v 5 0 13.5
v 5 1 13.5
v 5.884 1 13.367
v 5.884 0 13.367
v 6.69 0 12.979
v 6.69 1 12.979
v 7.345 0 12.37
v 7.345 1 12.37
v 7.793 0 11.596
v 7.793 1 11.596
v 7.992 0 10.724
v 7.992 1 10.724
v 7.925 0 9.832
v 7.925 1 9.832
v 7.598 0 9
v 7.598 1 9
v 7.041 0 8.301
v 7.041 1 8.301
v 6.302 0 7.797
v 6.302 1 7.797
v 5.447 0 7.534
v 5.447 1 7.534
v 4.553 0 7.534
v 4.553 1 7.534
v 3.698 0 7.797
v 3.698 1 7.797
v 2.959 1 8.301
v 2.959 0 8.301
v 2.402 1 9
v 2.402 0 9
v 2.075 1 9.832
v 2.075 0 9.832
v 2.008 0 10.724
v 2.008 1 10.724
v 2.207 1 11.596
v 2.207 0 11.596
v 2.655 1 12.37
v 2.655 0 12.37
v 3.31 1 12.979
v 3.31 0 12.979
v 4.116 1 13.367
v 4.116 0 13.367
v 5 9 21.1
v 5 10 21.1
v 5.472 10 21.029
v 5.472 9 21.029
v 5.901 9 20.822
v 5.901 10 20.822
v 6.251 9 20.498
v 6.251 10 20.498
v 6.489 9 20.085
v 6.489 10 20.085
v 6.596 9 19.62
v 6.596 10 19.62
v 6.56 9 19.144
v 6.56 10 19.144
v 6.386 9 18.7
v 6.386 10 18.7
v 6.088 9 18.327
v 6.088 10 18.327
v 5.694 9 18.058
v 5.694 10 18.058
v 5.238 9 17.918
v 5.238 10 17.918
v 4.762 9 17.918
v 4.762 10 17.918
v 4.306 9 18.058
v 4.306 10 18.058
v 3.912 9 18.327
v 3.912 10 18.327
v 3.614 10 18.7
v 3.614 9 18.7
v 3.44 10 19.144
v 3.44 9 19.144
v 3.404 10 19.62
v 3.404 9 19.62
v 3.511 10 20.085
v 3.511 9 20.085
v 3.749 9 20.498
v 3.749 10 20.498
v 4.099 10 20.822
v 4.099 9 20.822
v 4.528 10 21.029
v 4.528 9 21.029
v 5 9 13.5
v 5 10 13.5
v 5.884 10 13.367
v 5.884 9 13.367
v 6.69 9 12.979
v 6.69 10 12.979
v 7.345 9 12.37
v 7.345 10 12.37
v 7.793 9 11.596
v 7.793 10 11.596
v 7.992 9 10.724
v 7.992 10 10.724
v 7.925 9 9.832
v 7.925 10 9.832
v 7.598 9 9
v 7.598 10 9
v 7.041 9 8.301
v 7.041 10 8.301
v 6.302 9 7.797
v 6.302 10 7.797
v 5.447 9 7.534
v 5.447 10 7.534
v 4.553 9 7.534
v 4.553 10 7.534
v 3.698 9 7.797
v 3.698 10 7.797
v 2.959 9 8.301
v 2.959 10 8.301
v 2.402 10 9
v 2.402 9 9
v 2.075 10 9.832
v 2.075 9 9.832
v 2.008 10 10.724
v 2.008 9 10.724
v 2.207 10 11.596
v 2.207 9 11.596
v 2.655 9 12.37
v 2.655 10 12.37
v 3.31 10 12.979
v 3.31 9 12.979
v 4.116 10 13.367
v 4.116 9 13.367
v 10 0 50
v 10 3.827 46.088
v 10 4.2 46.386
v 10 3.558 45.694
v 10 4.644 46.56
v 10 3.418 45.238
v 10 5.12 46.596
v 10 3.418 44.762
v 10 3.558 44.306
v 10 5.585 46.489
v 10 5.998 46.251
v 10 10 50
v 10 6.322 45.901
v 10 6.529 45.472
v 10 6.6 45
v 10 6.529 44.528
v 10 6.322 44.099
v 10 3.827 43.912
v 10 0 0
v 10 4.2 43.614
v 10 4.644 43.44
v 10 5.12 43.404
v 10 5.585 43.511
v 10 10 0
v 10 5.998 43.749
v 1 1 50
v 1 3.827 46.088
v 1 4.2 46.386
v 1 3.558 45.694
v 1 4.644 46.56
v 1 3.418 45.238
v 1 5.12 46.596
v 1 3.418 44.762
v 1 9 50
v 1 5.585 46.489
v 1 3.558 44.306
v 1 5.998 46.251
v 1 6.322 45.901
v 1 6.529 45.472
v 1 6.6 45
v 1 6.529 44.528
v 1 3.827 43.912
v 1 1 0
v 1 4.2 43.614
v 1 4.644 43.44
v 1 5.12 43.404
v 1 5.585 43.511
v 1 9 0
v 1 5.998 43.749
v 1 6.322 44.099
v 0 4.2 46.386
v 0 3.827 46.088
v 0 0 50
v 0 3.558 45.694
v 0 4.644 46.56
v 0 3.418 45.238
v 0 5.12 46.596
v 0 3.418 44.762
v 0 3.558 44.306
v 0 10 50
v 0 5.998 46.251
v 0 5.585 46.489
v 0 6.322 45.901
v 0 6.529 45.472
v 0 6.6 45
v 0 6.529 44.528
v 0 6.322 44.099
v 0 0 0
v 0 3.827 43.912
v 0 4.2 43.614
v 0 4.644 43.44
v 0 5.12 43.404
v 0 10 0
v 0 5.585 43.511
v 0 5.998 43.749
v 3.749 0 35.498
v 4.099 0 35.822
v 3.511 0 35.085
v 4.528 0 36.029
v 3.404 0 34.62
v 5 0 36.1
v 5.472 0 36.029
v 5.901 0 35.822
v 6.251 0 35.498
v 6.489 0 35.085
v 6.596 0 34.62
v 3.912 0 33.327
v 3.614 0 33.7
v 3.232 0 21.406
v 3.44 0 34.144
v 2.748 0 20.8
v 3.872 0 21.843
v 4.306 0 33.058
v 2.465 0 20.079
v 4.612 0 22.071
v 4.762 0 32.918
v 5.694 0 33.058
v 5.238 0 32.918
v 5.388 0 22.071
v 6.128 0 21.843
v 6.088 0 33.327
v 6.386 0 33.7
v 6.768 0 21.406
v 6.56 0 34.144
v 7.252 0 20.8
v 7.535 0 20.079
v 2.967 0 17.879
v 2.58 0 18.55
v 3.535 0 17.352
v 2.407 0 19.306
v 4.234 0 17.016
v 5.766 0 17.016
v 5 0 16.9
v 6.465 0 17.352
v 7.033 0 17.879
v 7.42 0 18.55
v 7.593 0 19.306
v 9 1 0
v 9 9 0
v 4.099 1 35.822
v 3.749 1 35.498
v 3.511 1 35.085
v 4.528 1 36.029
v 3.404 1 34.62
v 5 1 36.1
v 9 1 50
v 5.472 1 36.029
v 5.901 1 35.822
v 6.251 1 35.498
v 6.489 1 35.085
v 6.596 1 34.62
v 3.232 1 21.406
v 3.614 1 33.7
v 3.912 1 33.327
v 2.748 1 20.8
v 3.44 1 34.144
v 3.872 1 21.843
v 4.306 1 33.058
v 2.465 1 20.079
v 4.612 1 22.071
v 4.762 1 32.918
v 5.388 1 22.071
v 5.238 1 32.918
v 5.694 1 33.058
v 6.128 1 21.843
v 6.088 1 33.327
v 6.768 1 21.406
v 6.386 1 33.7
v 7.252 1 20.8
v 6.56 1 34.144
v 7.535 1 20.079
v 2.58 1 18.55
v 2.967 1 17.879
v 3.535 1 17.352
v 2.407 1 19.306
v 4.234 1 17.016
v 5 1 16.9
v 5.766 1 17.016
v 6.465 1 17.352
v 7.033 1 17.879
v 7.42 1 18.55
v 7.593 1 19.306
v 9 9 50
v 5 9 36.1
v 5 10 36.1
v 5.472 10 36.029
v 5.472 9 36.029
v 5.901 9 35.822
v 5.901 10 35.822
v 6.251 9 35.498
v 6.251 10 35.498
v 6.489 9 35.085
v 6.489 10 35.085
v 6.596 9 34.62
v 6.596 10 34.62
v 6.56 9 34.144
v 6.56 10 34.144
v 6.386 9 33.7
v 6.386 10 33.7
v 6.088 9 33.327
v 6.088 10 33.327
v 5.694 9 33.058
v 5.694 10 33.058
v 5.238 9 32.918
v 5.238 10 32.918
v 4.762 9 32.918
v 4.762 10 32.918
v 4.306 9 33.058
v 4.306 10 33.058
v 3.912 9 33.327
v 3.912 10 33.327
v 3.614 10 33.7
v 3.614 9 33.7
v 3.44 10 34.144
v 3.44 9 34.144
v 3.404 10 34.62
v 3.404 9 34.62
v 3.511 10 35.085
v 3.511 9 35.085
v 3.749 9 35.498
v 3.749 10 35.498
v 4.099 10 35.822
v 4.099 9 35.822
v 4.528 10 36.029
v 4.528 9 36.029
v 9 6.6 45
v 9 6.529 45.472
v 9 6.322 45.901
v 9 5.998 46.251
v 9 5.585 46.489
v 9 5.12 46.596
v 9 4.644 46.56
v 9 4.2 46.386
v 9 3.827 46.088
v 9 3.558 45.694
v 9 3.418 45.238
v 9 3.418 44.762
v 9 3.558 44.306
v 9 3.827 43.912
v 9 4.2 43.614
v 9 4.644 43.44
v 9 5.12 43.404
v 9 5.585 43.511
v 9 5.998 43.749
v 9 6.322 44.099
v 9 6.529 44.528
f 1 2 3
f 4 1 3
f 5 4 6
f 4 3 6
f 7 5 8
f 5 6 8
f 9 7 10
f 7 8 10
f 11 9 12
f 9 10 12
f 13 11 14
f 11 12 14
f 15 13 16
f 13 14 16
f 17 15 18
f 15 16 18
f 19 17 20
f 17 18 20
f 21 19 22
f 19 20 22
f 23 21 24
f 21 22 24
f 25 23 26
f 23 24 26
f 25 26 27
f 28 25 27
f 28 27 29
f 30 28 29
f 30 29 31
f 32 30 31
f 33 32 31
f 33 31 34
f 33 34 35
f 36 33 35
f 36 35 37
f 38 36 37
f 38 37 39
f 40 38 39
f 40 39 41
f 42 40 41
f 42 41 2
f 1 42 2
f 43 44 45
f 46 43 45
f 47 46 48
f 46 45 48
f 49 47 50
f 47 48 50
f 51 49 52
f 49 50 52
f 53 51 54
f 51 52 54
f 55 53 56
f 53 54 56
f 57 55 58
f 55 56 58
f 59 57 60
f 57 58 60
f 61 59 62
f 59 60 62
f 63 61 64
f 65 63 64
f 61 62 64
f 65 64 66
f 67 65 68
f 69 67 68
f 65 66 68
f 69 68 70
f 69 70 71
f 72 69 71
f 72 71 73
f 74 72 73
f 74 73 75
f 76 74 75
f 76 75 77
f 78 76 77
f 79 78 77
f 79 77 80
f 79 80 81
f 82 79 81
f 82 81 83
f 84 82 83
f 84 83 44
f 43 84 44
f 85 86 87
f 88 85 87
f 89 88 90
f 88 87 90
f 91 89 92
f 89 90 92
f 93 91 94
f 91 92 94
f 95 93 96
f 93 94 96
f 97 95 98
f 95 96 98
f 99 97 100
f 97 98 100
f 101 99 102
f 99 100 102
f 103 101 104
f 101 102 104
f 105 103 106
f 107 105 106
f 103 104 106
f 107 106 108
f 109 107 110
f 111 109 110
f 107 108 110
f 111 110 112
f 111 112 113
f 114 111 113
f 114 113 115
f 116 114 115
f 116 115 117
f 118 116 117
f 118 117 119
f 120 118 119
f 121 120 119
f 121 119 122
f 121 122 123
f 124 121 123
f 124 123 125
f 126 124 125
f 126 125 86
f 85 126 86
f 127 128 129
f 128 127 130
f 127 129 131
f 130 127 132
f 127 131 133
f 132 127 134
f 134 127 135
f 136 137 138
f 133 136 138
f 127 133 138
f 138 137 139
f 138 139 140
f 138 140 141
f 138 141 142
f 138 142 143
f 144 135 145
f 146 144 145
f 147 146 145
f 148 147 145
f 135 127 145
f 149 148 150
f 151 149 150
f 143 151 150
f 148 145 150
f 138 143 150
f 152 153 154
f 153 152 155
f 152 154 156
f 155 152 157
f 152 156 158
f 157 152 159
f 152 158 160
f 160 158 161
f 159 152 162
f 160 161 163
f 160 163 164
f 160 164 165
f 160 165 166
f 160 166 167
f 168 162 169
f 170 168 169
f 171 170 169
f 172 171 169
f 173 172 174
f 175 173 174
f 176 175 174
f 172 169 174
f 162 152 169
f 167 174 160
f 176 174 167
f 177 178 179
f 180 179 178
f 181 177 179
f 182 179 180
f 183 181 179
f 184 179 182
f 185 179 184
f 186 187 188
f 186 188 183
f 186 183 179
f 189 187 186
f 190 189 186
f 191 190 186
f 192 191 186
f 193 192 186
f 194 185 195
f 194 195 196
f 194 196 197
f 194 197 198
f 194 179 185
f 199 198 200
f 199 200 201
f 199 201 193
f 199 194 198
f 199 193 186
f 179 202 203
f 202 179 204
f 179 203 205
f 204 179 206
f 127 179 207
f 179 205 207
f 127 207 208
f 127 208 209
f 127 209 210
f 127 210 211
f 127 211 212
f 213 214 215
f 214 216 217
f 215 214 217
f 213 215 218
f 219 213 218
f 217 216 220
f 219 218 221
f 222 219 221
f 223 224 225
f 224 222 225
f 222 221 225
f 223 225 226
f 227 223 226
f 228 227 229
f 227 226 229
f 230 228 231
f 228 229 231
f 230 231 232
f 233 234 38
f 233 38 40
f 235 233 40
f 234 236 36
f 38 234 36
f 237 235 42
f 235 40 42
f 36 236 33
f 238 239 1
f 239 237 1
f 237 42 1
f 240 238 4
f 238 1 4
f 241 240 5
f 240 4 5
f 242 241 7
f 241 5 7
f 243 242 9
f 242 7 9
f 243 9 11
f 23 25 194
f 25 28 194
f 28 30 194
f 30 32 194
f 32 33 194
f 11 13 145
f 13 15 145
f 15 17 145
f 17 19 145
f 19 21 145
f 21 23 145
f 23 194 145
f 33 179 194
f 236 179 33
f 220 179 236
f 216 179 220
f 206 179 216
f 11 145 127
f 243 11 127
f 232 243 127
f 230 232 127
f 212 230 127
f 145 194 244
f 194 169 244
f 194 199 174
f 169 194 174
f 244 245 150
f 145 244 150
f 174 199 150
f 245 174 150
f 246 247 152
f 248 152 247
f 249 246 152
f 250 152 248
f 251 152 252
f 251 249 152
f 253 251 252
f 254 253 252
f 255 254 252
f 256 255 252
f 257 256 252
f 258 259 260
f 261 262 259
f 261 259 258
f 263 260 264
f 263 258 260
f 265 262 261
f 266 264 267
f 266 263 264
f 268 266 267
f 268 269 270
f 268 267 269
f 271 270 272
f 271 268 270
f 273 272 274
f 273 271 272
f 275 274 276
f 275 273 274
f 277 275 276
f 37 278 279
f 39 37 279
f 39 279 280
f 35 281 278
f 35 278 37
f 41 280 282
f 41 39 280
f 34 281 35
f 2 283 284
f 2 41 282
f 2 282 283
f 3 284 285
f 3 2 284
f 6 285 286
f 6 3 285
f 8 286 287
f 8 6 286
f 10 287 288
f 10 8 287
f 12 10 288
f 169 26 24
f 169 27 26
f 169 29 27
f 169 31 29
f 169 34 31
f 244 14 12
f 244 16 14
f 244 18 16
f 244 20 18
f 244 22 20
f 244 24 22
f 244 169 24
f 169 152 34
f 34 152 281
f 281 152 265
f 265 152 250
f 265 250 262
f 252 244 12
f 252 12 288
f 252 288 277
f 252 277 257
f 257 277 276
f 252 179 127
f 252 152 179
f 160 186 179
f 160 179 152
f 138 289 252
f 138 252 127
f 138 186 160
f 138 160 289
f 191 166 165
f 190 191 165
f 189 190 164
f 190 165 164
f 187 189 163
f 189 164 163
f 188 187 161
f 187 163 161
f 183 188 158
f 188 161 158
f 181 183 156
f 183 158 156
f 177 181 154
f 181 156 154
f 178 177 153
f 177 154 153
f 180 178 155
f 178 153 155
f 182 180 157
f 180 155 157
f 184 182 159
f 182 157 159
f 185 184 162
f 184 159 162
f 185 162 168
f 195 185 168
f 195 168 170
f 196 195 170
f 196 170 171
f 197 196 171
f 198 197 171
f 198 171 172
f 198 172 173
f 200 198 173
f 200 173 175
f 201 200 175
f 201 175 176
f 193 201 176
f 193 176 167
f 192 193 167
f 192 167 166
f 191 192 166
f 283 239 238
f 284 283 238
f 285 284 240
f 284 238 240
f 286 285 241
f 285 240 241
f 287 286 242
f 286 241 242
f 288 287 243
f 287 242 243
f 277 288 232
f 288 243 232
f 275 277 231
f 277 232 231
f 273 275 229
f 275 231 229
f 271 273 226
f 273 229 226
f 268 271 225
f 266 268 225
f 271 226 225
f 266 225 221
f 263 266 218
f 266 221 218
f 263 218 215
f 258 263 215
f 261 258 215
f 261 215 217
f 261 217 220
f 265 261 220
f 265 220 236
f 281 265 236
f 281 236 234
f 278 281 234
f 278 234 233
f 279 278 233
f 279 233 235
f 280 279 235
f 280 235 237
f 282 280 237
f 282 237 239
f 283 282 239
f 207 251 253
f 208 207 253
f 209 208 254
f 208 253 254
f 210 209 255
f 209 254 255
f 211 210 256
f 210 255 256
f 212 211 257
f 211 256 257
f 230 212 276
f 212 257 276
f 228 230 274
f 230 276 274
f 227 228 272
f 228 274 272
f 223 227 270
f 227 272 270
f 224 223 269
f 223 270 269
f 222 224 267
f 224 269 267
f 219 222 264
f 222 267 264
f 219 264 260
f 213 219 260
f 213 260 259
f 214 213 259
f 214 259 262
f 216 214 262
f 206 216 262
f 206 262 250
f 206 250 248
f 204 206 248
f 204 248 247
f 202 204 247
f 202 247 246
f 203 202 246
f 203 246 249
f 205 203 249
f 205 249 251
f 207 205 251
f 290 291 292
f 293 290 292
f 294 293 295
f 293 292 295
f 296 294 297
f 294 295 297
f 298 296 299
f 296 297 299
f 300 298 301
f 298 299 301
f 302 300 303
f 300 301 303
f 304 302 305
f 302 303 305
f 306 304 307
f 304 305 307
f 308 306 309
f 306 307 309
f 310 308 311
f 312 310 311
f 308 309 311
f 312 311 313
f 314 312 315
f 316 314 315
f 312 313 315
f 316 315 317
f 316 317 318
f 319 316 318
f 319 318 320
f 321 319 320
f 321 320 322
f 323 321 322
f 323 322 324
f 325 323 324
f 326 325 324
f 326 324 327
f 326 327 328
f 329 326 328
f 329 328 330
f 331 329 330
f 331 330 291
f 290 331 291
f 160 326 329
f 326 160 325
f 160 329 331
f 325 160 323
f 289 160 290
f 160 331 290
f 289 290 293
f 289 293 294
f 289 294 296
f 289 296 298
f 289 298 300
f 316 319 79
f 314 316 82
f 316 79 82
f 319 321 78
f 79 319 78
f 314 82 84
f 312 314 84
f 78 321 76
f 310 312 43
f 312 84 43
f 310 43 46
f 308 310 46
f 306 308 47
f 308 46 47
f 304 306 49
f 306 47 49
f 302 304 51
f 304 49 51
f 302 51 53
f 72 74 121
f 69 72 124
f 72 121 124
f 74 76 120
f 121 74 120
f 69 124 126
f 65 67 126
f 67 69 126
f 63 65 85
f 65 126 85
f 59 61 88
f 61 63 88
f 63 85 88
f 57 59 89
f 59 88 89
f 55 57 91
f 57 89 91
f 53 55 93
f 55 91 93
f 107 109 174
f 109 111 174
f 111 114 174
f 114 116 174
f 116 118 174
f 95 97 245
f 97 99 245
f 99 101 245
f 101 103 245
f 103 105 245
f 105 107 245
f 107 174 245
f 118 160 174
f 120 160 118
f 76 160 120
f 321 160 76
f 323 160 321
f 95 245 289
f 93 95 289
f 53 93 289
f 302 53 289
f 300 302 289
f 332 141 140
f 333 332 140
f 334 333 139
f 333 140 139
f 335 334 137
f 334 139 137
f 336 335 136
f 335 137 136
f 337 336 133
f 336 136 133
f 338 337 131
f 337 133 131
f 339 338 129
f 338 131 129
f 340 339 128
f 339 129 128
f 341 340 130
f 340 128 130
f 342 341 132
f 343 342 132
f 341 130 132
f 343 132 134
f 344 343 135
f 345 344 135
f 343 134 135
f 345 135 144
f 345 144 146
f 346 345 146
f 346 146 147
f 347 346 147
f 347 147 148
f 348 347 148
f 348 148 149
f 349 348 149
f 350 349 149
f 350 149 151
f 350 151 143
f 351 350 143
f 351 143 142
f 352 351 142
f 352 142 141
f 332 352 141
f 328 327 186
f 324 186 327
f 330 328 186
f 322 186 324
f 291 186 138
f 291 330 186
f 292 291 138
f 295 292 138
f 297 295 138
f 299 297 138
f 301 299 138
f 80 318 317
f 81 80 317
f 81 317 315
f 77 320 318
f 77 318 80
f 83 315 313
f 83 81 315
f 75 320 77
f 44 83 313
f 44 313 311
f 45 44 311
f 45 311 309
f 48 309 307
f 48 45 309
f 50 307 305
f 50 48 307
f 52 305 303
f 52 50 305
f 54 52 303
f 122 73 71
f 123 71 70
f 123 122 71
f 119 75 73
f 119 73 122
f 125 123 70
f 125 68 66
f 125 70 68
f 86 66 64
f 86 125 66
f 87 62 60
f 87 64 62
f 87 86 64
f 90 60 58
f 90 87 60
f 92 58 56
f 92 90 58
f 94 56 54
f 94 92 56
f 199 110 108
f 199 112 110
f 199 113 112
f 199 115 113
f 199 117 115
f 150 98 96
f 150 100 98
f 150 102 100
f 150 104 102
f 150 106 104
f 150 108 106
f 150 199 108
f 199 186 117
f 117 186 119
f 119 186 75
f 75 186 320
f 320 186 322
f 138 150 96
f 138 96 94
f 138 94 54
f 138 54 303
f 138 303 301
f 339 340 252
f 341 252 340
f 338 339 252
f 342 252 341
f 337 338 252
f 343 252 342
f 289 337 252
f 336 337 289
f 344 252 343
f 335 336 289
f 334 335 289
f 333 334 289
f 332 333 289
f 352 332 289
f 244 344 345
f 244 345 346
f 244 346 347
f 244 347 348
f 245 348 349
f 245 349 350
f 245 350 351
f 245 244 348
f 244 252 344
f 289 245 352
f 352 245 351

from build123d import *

# Parameters (mm, degrees)
SKETCH_1_W          = 10
SKETCH_1_H          = 10
SKETCH_1_W_2        = 8
SKETCH_1_H_2        = 8
EXTRUDE_1_DEPTH     = 50
SKETCH_2_R          = 3
SKETCH_2_R_2        = 1.6
CUT_EXTRUDE_1_DEPTH = 52.961524227
CUT_EXTRUDE_2_REACH = 53.962
SKETCH_4_R          = 2.6
SKETCH_6_R          = 1.6
CUT_EXTRUDE_4_DEPTH = 52.961524227


with BuildPart() as part:
    # ｽｹｯﾁ1 → 押し出し-薄板1 (new body)
    with BuildSketch(Plane.XY):
        with Locations((5, 5)):
            Rectangle(SKETCH_1_W, SKETCH_1_H)
        with Locations((5, 5)):
            Rectangle(SKETCH_1_W_2, SKETCH_1_H_2, mode=Mode.SUBTRACT)
    extrude(amount=EXTRUDE_1_DEPTH)

    # ｽｹｯﾁ2 → ｶｯﾄ - 押し出し1 (cut, through all)
    with BuildSketch(Plane(origin=(0, 10, 0), x_dir=(1, 0, 0), z_dir=(0, 1, 0))):
        with Locations(Location((5, -10.5, 0), (0, 0, 270))):
            Circle(SKETCH_2_R)
        with Locations(Location((5, -19.5, 0), (0, 0, 270))):
            Circle(SKETCH_2_R_2)
        with Locations(Location((5, -34.5, 0), (0, 0, 270))):
            Circle(SKETCH_2_R_2)
    extrude(amount=-CUT_EXTRUDE_1_DEPTH, mode=Mode.SUBTRACT)

    # ｽｹｯﾁ4 → ｶｯﾄ - 押し出し2 (cut, up to next)
    with BuildSketch(Plane.XZ, mode=Mode.PRIVATE) as cut_extrude_2_sk1:
        with Locations(Location((5, 19.5, 0), (0, 0, 270))):
            Circle(SKETCH_4_R)
    cut_extrude_2_tool1 = extrude(cut_extrude_2_sk1.sketch, amount=-CUT_EXTRUDE_2_REACH, mode=Mode.PRIVATE) & part.part
    add(cut_extrude_2_tool1.solids().sort_by_distance((5, 0, 19.5))[0], mode=Mode.SUBTRACT)

    # ｽｹｯﾁ6 → ｶｯﾄ - 押し出し4 (cut, through all)
    with BuildSketch(Plane(origin=(10, 0, 0), x_dir=(0, 0, -1), z_dir=(1, 0, 0))):
        with Locations(Location((-45, 5, 0), (0, 0, 90))):
            Circle(SKETCH_6_R)
    extrude(amount=-CUT_EXTRUDE_4_DEPTH, mode=Mode.SUBTRACT)


solid = part.part
